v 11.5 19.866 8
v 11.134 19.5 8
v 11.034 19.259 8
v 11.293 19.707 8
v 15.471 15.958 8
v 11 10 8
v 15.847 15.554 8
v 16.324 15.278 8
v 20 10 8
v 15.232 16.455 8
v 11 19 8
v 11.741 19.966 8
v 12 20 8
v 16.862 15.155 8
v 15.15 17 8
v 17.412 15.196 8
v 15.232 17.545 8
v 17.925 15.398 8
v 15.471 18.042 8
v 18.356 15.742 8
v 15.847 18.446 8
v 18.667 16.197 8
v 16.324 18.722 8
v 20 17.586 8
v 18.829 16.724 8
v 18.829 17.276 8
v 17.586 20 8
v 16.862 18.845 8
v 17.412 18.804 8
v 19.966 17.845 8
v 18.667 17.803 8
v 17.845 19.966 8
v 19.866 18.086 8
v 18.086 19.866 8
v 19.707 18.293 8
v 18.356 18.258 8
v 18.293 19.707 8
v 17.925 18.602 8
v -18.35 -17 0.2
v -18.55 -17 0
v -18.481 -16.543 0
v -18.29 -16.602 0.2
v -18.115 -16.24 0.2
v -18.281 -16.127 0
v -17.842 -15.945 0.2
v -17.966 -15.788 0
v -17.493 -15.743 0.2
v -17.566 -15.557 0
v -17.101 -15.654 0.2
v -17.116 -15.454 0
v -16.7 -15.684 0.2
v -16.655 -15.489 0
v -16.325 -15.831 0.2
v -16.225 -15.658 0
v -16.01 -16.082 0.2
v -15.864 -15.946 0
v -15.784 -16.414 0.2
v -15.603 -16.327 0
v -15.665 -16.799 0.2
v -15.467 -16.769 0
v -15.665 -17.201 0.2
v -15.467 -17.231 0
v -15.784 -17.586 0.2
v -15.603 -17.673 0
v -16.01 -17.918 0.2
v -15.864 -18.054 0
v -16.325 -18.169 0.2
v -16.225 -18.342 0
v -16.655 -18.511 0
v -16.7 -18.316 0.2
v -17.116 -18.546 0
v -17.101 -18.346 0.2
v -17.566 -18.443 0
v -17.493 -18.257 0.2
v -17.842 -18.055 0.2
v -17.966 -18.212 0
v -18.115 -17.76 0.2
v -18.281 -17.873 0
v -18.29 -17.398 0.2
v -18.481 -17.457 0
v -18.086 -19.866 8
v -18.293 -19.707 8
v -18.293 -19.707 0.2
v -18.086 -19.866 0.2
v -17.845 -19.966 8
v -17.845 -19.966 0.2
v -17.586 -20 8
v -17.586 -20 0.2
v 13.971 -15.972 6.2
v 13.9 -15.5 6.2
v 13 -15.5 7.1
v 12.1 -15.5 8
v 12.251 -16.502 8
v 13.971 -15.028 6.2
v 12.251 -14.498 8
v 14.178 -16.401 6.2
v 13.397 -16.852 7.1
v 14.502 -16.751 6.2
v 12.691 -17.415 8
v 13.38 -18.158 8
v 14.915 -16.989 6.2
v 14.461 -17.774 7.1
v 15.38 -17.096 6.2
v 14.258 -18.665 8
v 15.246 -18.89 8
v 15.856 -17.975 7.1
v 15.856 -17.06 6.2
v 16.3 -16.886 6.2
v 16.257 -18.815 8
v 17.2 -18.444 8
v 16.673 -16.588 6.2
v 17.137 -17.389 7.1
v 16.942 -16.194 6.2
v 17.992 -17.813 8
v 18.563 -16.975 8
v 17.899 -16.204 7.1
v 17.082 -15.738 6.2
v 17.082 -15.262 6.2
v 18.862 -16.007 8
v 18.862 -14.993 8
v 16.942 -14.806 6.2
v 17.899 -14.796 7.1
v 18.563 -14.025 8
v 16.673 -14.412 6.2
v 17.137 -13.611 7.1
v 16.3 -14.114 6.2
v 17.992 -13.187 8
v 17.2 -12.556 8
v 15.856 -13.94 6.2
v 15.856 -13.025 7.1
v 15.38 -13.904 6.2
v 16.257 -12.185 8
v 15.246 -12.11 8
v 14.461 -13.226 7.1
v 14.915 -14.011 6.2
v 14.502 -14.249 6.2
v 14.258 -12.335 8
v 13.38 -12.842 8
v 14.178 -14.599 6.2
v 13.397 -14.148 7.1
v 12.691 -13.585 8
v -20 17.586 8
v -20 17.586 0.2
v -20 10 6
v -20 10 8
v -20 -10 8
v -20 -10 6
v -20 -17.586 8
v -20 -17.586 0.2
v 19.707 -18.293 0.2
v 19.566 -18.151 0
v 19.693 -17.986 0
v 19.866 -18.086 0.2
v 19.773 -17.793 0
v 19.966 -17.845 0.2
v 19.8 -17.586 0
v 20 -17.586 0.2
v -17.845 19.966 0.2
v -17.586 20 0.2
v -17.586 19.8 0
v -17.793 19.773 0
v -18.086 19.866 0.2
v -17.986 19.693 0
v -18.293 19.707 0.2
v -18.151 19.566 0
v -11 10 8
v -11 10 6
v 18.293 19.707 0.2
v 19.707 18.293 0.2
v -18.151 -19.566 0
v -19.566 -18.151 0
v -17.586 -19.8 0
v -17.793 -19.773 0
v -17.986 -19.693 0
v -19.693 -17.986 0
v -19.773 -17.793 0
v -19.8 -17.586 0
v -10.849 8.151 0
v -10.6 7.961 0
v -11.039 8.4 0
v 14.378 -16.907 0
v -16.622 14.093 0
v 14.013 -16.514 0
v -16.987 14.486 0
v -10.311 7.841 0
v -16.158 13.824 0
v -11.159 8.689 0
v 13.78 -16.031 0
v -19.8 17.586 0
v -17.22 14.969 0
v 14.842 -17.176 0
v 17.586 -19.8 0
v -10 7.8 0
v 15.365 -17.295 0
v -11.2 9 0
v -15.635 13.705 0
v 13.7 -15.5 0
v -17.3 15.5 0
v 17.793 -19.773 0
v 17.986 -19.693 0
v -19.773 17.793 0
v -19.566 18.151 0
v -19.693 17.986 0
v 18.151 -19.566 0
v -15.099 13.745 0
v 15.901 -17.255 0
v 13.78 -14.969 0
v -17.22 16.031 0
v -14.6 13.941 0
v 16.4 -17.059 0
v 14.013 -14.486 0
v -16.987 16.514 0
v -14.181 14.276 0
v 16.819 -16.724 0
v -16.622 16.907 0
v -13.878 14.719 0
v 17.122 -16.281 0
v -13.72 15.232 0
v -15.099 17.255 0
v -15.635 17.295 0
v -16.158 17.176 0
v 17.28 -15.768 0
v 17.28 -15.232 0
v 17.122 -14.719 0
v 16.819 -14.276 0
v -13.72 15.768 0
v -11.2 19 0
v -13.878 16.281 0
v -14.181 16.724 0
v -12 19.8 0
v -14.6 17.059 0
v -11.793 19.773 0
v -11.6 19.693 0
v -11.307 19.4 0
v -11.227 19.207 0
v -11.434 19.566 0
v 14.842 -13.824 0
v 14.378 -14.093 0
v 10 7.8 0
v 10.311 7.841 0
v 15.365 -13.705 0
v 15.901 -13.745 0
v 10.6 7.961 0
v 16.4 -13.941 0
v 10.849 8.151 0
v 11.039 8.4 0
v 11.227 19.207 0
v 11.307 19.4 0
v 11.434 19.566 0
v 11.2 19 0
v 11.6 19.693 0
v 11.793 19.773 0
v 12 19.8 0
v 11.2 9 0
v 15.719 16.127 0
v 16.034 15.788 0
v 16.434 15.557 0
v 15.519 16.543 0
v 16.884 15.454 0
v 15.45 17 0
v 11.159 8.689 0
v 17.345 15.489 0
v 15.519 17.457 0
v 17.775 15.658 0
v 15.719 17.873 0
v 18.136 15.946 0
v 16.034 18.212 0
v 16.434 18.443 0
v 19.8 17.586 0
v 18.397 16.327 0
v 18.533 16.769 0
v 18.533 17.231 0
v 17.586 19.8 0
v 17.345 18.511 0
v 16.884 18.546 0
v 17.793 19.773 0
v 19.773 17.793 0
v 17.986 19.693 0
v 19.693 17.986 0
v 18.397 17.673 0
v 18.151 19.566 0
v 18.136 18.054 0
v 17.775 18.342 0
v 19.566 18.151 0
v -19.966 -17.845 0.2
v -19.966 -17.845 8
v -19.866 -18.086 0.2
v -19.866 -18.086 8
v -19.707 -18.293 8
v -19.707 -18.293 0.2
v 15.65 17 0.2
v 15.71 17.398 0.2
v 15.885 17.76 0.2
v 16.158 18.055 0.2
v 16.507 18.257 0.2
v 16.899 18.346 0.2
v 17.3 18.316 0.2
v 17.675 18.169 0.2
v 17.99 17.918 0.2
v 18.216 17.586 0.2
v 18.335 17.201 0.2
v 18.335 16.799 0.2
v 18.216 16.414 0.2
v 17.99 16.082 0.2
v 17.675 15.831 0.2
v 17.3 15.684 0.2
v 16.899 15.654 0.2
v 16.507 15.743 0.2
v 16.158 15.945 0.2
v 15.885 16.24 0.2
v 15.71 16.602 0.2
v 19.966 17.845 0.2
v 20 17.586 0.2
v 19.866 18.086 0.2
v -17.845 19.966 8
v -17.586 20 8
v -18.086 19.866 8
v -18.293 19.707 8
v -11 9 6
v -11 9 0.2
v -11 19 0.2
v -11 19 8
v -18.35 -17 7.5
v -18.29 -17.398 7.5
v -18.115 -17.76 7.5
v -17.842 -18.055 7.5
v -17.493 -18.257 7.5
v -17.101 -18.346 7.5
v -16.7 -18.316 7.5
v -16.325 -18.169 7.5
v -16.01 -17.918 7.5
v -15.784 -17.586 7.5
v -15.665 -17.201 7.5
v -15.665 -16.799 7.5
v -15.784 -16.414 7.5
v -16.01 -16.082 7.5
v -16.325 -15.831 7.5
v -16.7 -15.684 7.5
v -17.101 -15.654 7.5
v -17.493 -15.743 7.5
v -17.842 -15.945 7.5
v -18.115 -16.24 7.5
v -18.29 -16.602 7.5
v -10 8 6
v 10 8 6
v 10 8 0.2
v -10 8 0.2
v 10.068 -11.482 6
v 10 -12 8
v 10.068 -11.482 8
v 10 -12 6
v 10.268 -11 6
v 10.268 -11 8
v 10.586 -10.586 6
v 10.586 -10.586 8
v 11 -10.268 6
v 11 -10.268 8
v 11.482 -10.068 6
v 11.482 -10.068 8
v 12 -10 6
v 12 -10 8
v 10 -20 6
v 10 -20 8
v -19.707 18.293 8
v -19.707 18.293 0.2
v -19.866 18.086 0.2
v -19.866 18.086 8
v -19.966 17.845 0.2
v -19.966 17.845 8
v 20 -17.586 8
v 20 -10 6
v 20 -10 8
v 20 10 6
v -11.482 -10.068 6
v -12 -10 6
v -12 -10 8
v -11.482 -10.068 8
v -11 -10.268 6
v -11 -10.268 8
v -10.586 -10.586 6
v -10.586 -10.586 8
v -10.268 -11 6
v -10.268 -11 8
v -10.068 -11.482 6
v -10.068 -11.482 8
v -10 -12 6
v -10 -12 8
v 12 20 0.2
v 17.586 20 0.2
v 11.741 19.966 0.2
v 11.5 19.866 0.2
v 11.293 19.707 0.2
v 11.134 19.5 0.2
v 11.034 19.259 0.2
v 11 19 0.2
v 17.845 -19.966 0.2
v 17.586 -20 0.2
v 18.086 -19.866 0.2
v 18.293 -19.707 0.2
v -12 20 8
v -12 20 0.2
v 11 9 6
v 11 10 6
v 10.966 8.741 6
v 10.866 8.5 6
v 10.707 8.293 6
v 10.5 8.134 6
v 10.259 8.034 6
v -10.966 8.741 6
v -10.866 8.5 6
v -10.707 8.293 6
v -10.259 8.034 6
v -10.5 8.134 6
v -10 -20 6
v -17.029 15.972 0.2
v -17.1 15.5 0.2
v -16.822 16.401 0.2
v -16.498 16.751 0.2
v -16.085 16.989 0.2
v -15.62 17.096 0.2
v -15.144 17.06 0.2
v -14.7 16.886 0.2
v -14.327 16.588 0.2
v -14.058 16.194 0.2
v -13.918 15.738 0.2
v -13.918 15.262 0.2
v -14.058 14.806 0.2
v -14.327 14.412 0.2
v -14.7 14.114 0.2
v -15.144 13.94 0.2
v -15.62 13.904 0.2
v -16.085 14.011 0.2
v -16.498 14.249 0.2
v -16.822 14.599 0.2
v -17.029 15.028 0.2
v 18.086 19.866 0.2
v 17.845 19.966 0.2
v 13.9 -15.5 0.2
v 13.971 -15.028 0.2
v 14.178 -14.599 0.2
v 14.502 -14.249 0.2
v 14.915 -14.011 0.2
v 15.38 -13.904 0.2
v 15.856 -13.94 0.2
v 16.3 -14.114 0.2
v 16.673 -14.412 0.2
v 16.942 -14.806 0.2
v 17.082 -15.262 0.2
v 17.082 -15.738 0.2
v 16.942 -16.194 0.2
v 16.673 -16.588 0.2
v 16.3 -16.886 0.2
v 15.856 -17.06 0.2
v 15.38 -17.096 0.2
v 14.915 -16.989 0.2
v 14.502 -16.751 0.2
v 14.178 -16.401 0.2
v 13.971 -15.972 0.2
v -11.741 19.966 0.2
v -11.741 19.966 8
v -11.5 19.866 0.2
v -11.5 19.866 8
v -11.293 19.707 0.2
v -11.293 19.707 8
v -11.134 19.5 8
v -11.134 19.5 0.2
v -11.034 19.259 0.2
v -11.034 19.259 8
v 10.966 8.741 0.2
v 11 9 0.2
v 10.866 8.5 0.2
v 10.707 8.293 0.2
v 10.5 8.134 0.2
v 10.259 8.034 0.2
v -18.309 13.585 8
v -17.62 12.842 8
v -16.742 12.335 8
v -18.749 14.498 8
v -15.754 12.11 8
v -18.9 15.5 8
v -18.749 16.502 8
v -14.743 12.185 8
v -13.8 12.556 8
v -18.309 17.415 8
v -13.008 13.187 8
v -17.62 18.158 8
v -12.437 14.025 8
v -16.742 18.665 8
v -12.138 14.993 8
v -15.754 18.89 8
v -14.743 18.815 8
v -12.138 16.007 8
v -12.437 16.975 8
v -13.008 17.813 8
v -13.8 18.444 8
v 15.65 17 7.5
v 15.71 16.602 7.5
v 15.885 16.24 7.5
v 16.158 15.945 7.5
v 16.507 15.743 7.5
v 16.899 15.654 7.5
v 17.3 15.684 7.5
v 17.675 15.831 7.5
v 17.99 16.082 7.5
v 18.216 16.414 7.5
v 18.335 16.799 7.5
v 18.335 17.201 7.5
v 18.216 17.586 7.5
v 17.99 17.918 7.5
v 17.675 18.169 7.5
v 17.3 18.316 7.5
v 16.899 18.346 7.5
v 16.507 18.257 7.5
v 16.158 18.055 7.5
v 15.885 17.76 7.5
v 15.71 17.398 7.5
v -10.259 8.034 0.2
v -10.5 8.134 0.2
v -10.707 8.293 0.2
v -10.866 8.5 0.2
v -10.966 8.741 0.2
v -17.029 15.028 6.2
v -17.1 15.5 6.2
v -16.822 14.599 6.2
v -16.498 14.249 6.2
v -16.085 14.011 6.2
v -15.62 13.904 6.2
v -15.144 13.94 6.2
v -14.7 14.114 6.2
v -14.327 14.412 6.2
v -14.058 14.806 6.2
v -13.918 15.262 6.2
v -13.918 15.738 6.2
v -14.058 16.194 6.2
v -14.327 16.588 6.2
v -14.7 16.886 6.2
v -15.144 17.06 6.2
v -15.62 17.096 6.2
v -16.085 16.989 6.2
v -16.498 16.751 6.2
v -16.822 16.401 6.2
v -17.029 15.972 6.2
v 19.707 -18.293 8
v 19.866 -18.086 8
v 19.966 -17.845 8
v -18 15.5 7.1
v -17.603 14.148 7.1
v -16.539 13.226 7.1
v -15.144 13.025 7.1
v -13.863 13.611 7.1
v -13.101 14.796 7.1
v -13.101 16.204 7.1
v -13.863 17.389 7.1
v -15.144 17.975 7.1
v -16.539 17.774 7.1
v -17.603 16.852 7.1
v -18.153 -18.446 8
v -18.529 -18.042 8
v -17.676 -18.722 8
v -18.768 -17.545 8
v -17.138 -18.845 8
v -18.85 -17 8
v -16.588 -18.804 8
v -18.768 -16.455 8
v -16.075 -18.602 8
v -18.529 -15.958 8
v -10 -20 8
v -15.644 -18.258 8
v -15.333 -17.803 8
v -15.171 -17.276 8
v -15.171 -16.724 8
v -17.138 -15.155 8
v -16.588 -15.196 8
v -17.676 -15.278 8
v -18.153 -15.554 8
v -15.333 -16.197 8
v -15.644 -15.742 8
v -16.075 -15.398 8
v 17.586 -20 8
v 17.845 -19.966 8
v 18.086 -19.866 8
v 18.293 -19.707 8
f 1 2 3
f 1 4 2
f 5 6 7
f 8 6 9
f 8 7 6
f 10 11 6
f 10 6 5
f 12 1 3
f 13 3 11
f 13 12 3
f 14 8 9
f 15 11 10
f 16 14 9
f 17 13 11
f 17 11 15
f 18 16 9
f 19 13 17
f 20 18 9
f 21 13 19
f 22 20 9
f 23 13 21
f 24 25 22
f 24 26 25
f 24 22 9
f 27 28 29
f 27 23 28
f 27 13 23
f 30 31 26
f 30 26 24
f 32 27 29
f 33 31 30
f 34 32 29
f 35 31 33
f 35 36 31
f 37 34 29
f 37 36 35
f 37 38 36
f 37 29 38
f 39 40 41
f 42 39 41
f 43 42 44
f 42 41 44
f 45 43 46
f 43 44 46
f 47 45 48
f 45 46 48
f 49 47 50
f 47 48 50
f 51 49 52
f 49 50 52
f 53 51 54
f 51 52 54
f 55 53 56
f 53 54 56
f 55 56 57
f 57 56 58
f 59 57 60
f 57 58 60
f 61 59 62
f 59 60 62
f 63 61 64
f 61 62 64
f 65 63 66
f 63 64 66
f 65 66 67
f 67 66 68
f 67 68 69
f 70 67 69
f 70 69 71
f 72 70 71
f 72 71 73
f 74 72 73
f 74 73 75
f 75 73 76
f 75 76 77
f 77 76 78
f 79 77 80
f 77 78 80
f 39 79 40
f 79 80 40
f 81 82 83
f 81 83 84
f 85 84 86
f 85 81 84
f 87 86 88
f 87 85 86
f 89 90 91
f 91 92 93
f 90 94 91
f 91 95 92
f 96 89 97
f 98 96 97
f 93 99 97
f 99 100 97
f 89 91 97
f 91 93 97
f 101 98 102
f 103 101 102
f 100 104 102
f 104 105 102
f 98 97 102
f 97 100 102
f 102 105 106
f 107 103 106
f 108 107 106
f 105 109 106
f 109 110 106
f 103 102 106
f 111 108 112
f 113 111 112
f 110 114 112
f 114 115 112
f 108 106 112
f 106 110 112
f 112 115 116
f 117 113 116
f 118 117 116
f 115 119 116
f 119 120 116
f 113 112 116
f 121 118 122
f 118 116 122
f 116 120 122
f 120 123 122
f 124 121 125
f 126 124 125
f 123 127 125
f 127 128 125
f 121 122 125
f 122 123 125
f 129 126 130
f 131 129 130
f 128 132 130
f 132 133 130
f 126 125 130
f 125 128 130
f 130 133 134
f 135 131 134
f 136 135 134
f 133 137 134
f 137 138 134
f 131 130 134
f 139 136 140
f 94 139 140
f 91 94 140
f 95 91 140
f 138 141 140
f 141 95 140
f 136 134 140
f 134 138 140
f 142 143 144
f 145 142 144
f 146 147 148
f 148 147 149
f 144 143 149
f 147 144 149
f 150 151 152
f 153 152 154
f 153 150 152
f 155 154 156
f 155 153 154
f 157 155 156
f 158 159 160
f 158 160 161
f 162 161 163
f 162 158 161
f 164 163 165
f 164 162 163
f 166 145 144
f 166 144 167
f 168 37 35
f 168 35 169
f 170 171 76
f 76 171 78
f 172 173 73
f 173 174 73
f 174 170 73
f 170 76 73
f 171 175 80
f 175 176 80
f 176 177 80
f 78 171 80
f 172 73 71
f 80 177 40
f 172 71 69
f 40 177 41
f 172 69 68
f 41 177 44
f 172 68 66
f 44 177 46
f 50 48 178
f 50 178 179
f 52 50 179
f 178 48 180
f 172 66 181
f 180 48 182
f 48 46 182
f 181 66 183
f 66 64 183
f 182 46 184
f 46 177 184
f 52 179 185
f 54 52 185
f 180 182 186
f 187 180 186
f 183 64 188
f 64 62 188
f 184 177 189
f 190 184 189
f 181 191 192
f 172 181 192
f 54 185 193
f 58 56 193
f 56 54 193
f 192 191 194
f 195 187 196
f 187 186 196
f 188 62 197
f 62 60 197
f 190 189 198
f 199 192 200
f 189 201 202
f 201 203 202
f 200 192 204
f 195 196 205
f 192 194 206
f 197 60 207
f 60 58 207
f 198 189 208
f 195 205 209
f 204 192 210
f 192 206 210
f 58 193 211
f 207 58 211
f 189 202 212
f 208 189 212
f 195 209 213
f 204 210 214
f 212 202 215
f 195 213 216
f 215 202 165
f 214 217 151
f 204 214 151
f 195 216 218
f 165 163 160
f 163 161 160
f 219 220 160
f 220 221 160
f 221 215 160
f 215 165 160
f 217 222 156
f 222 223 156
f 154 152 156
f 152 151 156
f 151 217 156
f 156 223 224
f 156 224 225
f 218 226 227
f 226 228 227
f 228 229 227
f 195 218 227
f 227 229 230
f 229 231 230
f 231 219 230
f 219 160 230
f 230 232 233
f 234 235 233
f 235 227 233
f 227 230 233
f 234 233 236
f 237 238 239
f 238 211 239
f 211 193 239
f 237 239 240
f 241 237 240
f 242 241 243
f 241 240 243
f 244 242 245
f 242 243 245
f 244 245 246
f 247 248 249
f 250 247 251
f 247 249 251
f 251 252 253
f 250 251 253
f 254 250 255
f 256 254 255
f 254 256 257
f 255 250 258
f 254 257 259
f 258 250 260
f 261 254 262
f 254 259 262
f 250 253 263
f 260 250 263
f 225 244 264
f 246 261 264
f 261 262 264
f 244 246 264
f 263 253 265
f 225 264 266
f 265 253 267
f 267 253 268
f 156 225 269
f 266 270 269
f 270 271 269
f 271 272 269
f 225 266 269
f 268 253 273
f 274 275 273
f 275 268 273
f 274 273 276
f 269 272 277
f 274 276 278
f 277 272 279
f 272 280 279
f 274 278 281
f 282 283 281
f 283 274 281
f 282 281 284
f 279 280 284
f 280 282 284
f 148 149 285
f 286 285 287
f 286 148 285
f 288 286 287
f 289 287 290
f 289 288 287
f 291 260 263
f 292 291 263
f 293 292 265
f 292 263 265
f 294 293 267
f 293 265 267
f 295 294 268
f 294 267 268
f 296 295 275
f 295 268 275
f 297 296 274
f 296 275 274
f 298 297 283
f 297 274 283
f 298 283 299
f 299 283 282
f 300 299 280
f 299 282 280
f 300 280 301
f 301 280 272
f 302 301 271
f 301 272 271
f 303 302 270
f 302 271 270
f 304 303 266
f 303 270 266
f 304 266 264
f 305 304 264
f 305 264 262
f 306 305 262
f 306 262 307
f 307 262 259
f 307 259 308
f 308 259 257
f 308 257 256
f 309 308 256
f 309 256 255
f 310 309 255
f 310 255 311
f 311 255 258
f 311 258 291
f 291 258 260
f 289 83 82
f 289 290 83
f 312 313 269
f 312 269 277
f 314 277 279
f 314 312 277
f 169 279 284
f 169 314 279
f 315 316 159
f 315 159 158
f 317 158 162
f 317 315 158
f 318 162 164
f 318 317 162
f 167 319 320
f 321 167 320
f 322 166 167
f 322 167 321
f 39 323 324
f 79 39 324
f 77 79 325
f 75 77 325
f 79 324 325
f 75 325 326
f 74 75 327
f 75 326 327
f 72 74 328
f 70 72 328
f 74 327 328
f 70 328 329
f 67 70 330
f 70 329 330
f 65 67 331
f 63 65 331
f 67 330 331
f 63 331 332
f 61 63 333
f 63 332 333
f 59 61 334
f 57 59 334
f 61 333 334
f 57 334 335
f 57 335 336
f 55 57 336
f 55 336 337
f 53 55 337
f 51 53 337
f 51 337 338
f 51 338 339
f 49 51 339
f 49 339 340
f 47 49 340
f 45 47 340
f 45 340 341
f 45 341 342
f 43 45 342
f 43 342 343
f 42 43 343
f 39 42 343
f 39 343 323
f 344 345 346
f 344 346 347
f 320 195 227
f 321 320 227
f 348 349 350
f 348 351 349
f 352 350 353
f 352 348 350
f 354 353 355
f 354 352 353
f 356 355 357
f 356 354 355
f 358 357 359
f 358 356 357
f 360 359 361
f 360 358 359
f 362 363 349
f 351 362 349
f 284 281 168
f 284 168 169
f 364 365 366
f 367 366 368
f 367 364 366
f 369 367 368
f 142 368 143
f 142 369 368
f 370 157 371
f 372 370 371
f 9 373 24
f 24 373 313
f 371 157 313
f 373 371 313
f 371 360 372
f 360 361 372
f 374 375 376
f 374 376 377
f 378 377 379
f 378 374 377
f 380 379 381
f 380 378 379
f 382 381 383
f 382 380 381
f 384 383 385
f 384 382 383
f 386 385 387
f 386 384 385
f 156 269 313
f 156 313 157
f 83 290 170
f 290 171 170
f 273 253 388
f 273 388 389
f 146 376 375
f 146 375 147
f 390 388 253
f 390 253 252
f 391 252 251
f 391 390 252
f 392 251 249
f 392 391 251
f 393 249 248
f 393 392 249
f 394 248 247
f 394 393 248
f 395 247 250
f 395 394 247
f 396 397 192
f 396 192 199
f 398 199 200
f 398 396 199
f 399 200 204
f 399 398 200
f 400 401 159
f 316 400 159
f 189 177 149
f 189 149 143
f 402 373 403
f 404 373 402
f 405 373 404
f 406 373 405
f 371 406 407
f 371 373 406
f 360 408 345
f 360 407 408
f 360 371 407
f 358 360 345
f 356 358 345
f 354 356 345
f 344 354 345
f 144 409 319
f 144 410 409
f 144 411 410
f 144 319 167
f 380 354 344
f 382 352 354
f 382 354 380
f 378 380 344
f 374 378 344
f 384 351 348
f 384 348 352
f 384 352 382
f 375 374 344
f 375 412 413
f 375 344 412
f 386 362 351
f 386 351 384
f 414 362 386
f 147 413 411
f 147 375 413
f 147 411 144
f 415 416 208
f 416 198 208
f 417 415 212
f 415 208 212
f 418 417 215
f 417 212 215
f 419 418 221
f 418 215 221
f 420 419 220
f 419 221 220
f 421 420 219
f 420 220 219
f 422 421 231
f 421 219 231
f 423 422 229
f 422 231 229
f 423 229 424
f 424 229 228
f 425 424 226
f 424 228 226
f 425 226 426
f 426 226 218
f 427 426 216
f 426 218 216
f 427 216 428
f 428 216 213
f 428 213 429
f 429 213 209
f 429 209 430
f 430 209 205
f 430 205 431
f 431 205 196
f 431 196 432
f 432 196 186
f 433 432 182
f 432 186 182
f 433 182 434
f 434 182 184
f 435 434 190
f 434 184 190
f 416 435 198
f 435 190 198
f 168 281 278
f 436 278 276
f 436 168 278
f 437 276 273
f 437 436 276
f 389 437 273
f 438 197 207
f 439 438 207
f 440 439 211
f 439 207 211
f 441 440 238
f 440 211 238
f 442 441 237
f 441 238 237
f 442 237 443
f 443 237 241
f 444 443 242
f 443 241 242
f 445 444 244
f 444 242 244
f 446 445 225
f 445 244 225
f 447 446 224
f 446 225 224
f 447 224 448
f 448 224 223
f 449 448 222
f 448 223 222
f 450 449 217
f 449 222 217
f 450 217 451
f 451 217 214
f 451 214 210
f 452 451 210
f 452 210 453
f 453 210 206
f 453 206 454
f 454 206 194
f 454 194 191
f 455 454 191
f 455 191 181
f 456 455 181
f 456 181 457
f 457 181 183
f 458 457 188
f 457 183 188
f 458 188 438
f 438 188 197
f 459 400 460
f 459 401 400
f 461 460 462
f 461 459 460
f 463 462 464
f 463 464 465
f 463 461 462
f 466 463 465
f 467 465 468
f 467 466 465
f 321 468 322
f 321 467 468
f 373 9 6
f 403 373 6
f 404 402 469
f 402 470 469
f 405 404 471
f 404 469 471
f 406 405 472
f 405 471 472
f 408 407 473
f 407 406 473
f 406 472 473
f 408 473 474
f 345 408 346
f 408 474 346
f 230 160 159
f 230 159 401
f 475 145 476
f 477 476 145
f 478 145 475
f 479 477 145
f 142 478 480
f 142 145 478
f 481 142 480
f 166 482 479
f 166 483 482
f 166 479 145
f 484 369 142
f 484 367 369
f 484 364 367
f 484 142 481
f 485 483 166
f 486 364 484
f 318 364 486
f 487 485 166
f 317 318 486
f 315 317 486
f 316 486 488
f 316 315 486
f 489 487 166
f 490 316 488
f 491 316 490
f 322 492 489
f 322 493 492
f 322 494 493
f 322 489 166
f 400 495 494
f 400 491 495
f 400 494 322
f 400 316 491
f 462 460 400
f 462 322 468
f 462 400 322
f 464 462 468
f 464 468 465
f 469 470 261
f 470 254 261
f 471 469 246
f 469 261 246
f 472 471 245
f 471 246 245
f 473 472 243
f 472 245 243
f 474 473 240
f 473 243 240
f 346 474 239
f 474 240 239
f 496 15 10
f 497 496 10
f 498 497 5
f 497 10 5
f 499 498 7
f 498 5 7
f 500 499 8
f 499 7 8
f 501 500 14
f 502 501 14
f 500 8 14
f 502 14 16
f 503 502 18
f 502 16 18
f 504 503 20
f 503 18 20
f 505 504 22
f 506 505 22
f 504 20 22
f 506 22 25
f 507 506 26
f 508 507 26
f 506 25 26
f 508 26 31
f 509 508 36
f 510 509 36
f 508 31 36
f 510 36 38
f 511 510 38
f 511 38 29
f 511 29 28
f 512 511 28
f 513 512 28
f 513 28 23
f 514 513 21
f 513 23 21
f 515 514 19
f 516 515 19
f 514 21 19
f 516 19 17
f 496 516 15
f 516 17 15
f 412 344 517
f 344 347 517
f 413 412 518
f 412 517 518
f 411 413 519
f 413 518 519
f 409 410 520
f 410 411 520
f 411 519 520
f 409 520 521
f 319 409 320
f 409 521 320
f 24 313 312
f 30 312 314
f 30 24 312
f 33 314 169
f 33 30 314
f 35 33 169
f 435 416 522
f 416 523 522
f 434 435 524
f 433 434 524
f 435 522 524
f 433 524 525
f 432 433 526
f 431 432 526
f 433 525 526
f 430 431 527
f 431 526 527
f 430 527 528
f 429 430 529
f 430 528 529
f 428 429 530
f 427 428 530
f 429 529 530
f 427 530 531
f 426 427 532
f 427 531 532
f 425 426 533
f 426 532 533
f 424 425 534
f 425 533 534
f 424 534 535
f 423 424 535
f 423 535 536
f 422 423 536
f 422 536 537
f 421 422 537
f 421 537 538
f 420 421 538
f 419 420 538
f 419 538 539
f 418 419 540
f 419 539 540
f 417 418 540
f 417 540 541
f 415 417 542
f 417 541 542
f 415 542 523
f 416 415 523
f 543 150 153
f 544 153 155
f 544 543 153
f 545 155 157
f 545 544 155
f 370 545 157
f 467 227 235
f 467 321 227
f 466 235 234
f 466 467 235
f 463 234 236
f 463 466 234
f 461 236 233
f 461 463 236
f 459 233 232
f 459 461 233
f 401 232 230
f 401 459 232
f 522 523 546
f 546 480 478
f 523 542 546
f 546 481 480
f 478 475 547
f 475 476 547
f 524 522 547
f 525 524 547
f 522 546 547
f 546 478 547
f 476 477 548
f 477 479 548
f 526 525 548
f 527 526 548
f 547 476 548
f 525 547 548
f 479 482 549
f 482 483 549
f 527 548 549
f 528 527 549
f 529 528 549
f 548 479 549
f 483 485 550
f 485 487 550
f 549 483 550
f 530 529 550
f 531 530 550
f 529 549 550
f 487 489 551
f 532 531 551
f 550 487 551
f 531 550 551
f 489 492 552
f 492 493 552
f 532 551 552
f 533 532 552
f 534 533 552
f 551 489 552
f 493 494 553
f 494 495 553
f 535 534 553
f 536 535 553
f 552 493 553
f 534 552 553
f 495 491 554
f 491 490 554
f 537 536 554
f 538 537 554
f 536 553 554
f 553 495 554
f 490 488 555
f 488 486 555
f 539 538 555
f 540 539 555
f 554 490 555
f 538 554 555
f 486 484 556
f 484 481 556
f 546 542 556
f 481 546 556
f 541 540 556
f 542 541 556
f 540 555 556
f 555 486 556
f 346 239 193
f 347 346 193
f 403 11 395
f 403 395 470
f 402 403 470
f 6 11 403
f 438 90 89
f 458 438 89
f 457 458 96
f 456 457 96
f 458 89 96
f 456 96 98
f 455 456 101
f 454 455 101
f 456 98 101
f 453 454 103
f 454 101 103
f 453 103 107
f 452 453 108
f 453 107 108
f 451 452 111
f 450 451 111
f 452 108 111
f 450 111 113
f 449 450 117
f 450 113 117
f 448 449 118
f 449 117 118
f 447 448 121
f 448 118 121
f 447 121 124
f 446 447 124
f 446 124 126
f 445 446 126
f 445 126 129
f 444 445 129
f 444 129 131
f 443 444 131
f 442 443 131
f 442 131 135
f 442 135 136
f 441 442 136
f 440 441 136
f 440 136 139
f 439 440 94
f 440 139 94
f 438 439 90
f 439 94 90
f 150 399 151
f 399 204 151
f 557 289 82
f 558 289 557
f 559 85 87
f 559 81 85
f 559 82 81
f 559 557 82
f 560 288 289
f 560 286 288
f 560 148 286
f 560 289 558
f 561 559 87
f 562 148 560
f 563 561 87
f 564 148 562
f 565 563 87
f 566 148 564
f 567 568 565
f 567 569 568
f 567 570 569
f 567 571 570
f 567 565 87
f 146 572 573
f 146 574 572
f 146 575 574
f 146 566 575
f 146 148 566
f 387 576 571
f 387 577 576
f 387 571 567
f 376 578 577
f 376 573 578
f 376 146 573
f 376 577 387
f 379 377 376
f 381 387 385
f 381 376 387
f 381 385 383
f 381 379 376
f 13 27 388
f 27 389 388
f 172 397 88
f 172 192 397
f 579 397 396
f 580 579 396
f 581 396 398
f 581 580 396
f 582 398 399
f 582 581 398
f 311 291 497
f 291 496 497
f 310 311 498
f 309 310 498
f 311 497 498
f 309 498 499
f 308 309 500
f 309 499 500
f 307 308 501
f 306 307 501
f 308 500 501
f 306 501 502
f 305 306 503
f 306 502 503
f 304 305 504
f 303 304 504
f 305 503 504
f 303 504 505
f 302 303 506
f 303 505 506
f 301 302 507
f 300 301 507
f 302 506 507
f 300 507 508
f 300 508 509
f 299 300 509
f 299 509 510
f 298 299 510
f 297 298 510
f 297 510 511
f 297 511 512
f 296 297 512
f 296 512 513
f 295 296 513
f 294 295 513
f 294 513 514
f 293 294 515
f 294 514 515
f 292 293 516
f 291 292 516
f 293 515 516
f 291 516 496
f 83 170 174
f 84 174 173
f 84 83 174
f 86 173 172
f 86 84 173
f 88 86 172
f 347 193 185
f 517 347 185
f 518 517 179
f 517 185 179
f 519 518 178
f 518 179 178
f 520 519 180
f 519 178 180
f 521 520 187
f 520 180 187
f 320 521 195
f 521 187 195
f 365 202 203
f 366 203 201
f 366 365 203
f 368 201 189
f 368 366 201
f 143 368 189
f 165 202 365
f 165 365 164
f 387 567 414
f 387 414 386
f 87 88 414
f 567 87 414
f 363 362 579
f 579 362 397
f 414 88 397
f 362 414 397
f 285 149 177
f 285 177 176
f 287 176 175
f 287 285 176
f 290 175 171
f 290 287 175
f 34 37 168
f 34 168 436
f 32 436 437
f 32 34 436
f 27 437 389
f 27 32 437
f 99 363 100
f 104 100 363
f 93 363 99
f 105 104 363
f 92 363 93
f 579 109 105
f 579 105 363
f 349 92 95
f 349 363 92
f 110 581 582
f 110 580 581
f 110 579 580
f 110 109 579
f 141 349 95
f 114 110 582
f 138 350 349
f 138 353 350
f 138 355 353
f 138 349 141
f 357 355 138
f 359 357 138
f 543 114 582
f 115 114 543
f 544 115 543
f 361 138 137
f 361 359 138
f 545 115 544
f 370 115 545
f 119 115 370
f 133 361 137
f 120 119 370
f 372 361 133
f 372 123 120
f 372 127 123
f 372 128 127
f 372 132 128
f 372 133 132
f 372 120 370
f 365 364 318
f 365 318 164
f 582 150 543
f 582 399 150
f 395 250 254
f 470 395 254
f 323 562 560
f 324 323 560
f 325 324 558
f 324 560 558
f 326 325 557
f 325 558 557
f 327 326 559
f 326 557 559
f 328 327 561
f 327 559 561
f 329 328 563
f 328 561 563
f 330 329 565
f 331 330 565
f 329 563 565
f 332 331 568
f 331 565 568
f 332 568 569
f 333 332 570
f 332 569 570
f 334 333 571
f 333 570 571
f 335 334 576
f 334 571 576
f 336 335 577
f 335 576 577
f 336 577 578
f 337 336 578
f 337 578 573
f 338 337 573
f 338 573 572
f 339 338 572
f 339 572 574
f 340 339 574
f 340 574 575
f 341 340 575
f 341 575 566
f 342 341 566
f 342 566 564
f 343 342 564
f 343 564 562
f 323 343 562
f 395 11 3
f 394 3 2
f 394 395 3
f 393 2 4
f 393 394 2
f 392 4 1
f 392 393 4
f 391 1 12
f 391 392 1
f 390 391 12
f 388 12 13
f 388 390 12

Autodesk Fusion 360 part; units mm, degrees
sketch "Sketch1" plane through (0, 0, 0) normal (0, 0, 1) x (1, 0, 0)
  line L0 (20, 20) -> (-20, 20)
  line L1 (-20, 20) -> (-20, -20)
  line L2 (-20, -20) -> (20, -20)
  line L3 (20, -20) -> (20, 20)
  line L4 (20, 20) -> (-20, -20) construction
  line L5 (-20, 20) -> (20, -20) construction
  dimension "d1" = 40
  dimension "d2" = 40
extrude "Extrude1" add sketch "Sketch1" along normal blind 8
sketch "Sketch2" plane through (0, 0, 8) normal (0, 0, 1) x (-1, 0, 0)
  line L0 (-20, 20) -> (-20, -20)
  line L1 (-20, -20) -> (20, -20)
  line L2 (20, -20) -> (20, 20)
  line L3 (20, 20) -> (-20, 20)
  circle A0 centre (15.5, -15.5) radius 1.6
  line L4 (-15.5, -15.5) -> (15.5, -15.5) construction
  line L5 (15.5, -15.5) -> (15.5, 15.5) construction
  line L6 (15.5, 15.5) -> (-15.5, 15.5) construction
  line L7 (-15.5, 15.5) -> (-15.5, -15.5) construction
  line L8 (-15.5, -15.5) -> (15.5, 15.5) construction
  line L9 (15.5, -15.5) -> (-15.5, 15.5) construction
  circle A1 centre (-15.5, 15.5) radius 1.6
  dimension "d5" = 3.2
  dimension "d6" = 31
  dimension "d7" = 31
  dimension "d8" = 3.2
extrude "Extrude2" cut sketch "Sketch2" against normal blind 15 contours A0 | A1
sketch "Sketch3" plane through (0, 0, 8) normal (0, 0, 1) x (-1, 0, 0)
  circle A0 centre (15.5, -15.5) radius 1.6
  circle A1 centre (-15.5, 15.5) radius 1.6
  line L0 (-20, 20) -> (-20, -20)
  line L1 (-20, -20) -> (20, -20)
  line L2 (20, -20) -> (20, 20)
  line L3 (20, 20) -> (-20, 20)
  line L4 (-17, -17) -> (17, -17) construction
  line L5 (17, -17) -> (17, 17) construction
  line L6 (17, 17) -> (-17, 17) construction
  line L7 (-17, 17) -> (-17, -17) construction
  line L8 (-17, -17) -> (17, 17) construction
  line L9 (17, -17) -> (-17, 17) construction
  circle A2 centre (-17, -17) radius 1.35
  circle A3 centre (17, 17) radius 1.35
  dimension "d11" = 34
  dimension "d12" = 34
  dimension "d13" = 2.7
  dimension "d14" = 2.7
extrude "Extrude3" cut sketch "Sketch3" against normal blind 12 contours A2 | A3
chamfer "Chamfer1" distance 1.8 angle 45 2 edges at (-14.0083, 14.9214, 8) (16.9917, -16.0786, 8)
chamfer "Chamfer2" distance 2 angle 45 4 edges at (20, -20, 4) (-20, -20, 4) (20, 20, 4) (-20, 20, 4)
sketch "Sketch4" plane through (0, 0, 8) normal (0, 0, 1) x (-1, 0, 0)
  circle A0 centre (15.5, -15.5) radius 3.4
  circle A1 centre (-17, -17) radius 1.35
  circle A2 centre (17, 17) radius 1.35
  line L0 (18, -20) -> (20, -18)
  line L1 (20, -18) -> (20, 18)
  line L2 (20, 18) -> (18, 20)
  line L3 (18, 20) -> (-18, 20)
  line L4 (-18, 20) -> (-20, 18)
  line L5 (-20, 18) -> (-20, -18)
  line L6 (-20, -18) -> (-18, -20)
  line L7 (-18, -20) -> (18, -20)
  circle A3 centre (-15.5, 15.5) radius 3.4
chamfer "Chamfer3" distance 0.5 angle 45 2 edges at (-15.7414, -17.4882, 8) (18.2586, 16.5118, 8)
sketch "Sketch5" plane through (0, 0, 8) normal (0, 0, 1) x (-1, 0, 0)
  line L0 (11, -20) -> (-11, -20)
  line L1 (-11, -20) -> (-11, -8)
  line L2 (-11, -8) -> (11, -8)
  line L3 (11, -8) -> (11, -20)
  line L4 (-18, -20) -> (18, -20)
  point P0 (0, -8)
  dimension "d20" = 22
  dimension "d21" = 12
extrude "Extrude4" cut sketch "Sketch5" against normal blind 15
fillet "Fillet1" radius 1 4 edges at (-11, 8, 4) (11, 8, 4) (11, 20, 4) (-11, 20, 4)
fillet "Fillet1" radius 1 8 edges at (-18, 20, 4) (-20, 18, 4) (-20, -18, 4) (-18, -20, 4) (18, -20, 4) (20, -18, 4) (20, 18, 4) (18, 20, 4)
chamfer "Chamfer4" distance 0.2 angle 45 1 faces at (-3.942, -7.6818, 0)
sketch "Sketch6" plane through (0, 0, 8) normal (0, 0, 1) x (-1, 0, 0)
  circle A0 centre (17, 17) radius 1.85
  circle A1 centre (15.5, -15.5) radius 3.4
  circle A2 centre (-15.5, 15.5) radius 3.4
  circle A3 centre (-17, -17) radius 1.85
  arc A4 (-18.2929, -19.7071) -> (-17.5858, -20) centre (-17.5858, -19) ccw
  line L0 (-17.5858, -20) -> (-12, -20)
  arc A5 (-12, -20) -> (-11, -19) centre (-12, -19) ccw
  line L1 (-11, -19) -> (-11, -9)
  arc A6 (-10, -8) -> (-11, -9) centre (-10, -9) ccw
  line L2 (-10, -8) -> (10, -8)
  arc A7 (11, -9) -> (10, -8) centre (10, -9) ccw
  line L3 (11, -9) -> (11, -19)
  arc A8 (11, -19) -> (12, -20) centre (12, -19) ccw
  line L4 (12, -20) -> (17.5858, -20)
  arc A9 (17.5858, -20) -> (18.2929, -19.7071) centre (17.5858, -19) ccw
  line L5 (18.2929, -19.7071) -> (19.7071, -18.2929)
  arc A10 (19.7071, -18.2929) -> (20, -17.5858) centre (19, -17.5858) ccw
  line L6 (20, -17.5858) -> (20, 17.5858)
  arc A11 (20, 17.5858) -> (19.7071, 18.2929) centre (19, 17.5858) ccw
  line L7 (19.7071, 18.2929) -> (18.2929, 19.7071)
  arc A12 (18.2929, 19.7071) -> (17.5858, 20) centre (17.5858, 19) ccw
  line L8 (17.5858, 20) -> (-17.5858, 20)
  arc A13 (-17.5858, 20) -> (-18.2929, 19.7071) centre (-17.5858, 19) ccw
  line L9 (-18.2929, 19.7071) -> (-19.7071, 18.2929)
  arc A14 (-19.7071, 18.2929) -> (-20, 17.5858) centre (-19, 17.5858) ccw
  line L10 (-20, 17.5858) -> (-20, -17.5858)
  arc A15 (-20, -17.5858) -> (-19.7071, -18.2929) centre (-19, -17.5858) ccw
  line L11 (-19.7071, -18.2929) -> (-18.2929, -19.7071)
  line L12 (-10, 20) -> (-10, 10)
  line L13 (-10, 10) -> (-20, 10)
  line L14 (-20, -10) -> (-11, -10)
  line L15 (0, -2.5) -> (0, -20)
  line L16 (10, 20) -> (10, 10)
  line L17 (10, 10) -> (20, 10)
  line L18 (20, -10) -> (11, -10)
  line L19 (11, -10) -> (10.0078, -10.7171)
  dimension "d29" = 10
  dimension "d32" = 10
  dimension "d37" = 10
extrude "Extrude5" cut sketch "Sketch6" against normal blind 2 contours L1 A6 L2 A7 L3 L6 L8 L10 L12 L13 L14 L16 L17 L18
fillet "Fillet2" radius 2 2 edges at (10, -10, 7) (-10, -10, 7)
